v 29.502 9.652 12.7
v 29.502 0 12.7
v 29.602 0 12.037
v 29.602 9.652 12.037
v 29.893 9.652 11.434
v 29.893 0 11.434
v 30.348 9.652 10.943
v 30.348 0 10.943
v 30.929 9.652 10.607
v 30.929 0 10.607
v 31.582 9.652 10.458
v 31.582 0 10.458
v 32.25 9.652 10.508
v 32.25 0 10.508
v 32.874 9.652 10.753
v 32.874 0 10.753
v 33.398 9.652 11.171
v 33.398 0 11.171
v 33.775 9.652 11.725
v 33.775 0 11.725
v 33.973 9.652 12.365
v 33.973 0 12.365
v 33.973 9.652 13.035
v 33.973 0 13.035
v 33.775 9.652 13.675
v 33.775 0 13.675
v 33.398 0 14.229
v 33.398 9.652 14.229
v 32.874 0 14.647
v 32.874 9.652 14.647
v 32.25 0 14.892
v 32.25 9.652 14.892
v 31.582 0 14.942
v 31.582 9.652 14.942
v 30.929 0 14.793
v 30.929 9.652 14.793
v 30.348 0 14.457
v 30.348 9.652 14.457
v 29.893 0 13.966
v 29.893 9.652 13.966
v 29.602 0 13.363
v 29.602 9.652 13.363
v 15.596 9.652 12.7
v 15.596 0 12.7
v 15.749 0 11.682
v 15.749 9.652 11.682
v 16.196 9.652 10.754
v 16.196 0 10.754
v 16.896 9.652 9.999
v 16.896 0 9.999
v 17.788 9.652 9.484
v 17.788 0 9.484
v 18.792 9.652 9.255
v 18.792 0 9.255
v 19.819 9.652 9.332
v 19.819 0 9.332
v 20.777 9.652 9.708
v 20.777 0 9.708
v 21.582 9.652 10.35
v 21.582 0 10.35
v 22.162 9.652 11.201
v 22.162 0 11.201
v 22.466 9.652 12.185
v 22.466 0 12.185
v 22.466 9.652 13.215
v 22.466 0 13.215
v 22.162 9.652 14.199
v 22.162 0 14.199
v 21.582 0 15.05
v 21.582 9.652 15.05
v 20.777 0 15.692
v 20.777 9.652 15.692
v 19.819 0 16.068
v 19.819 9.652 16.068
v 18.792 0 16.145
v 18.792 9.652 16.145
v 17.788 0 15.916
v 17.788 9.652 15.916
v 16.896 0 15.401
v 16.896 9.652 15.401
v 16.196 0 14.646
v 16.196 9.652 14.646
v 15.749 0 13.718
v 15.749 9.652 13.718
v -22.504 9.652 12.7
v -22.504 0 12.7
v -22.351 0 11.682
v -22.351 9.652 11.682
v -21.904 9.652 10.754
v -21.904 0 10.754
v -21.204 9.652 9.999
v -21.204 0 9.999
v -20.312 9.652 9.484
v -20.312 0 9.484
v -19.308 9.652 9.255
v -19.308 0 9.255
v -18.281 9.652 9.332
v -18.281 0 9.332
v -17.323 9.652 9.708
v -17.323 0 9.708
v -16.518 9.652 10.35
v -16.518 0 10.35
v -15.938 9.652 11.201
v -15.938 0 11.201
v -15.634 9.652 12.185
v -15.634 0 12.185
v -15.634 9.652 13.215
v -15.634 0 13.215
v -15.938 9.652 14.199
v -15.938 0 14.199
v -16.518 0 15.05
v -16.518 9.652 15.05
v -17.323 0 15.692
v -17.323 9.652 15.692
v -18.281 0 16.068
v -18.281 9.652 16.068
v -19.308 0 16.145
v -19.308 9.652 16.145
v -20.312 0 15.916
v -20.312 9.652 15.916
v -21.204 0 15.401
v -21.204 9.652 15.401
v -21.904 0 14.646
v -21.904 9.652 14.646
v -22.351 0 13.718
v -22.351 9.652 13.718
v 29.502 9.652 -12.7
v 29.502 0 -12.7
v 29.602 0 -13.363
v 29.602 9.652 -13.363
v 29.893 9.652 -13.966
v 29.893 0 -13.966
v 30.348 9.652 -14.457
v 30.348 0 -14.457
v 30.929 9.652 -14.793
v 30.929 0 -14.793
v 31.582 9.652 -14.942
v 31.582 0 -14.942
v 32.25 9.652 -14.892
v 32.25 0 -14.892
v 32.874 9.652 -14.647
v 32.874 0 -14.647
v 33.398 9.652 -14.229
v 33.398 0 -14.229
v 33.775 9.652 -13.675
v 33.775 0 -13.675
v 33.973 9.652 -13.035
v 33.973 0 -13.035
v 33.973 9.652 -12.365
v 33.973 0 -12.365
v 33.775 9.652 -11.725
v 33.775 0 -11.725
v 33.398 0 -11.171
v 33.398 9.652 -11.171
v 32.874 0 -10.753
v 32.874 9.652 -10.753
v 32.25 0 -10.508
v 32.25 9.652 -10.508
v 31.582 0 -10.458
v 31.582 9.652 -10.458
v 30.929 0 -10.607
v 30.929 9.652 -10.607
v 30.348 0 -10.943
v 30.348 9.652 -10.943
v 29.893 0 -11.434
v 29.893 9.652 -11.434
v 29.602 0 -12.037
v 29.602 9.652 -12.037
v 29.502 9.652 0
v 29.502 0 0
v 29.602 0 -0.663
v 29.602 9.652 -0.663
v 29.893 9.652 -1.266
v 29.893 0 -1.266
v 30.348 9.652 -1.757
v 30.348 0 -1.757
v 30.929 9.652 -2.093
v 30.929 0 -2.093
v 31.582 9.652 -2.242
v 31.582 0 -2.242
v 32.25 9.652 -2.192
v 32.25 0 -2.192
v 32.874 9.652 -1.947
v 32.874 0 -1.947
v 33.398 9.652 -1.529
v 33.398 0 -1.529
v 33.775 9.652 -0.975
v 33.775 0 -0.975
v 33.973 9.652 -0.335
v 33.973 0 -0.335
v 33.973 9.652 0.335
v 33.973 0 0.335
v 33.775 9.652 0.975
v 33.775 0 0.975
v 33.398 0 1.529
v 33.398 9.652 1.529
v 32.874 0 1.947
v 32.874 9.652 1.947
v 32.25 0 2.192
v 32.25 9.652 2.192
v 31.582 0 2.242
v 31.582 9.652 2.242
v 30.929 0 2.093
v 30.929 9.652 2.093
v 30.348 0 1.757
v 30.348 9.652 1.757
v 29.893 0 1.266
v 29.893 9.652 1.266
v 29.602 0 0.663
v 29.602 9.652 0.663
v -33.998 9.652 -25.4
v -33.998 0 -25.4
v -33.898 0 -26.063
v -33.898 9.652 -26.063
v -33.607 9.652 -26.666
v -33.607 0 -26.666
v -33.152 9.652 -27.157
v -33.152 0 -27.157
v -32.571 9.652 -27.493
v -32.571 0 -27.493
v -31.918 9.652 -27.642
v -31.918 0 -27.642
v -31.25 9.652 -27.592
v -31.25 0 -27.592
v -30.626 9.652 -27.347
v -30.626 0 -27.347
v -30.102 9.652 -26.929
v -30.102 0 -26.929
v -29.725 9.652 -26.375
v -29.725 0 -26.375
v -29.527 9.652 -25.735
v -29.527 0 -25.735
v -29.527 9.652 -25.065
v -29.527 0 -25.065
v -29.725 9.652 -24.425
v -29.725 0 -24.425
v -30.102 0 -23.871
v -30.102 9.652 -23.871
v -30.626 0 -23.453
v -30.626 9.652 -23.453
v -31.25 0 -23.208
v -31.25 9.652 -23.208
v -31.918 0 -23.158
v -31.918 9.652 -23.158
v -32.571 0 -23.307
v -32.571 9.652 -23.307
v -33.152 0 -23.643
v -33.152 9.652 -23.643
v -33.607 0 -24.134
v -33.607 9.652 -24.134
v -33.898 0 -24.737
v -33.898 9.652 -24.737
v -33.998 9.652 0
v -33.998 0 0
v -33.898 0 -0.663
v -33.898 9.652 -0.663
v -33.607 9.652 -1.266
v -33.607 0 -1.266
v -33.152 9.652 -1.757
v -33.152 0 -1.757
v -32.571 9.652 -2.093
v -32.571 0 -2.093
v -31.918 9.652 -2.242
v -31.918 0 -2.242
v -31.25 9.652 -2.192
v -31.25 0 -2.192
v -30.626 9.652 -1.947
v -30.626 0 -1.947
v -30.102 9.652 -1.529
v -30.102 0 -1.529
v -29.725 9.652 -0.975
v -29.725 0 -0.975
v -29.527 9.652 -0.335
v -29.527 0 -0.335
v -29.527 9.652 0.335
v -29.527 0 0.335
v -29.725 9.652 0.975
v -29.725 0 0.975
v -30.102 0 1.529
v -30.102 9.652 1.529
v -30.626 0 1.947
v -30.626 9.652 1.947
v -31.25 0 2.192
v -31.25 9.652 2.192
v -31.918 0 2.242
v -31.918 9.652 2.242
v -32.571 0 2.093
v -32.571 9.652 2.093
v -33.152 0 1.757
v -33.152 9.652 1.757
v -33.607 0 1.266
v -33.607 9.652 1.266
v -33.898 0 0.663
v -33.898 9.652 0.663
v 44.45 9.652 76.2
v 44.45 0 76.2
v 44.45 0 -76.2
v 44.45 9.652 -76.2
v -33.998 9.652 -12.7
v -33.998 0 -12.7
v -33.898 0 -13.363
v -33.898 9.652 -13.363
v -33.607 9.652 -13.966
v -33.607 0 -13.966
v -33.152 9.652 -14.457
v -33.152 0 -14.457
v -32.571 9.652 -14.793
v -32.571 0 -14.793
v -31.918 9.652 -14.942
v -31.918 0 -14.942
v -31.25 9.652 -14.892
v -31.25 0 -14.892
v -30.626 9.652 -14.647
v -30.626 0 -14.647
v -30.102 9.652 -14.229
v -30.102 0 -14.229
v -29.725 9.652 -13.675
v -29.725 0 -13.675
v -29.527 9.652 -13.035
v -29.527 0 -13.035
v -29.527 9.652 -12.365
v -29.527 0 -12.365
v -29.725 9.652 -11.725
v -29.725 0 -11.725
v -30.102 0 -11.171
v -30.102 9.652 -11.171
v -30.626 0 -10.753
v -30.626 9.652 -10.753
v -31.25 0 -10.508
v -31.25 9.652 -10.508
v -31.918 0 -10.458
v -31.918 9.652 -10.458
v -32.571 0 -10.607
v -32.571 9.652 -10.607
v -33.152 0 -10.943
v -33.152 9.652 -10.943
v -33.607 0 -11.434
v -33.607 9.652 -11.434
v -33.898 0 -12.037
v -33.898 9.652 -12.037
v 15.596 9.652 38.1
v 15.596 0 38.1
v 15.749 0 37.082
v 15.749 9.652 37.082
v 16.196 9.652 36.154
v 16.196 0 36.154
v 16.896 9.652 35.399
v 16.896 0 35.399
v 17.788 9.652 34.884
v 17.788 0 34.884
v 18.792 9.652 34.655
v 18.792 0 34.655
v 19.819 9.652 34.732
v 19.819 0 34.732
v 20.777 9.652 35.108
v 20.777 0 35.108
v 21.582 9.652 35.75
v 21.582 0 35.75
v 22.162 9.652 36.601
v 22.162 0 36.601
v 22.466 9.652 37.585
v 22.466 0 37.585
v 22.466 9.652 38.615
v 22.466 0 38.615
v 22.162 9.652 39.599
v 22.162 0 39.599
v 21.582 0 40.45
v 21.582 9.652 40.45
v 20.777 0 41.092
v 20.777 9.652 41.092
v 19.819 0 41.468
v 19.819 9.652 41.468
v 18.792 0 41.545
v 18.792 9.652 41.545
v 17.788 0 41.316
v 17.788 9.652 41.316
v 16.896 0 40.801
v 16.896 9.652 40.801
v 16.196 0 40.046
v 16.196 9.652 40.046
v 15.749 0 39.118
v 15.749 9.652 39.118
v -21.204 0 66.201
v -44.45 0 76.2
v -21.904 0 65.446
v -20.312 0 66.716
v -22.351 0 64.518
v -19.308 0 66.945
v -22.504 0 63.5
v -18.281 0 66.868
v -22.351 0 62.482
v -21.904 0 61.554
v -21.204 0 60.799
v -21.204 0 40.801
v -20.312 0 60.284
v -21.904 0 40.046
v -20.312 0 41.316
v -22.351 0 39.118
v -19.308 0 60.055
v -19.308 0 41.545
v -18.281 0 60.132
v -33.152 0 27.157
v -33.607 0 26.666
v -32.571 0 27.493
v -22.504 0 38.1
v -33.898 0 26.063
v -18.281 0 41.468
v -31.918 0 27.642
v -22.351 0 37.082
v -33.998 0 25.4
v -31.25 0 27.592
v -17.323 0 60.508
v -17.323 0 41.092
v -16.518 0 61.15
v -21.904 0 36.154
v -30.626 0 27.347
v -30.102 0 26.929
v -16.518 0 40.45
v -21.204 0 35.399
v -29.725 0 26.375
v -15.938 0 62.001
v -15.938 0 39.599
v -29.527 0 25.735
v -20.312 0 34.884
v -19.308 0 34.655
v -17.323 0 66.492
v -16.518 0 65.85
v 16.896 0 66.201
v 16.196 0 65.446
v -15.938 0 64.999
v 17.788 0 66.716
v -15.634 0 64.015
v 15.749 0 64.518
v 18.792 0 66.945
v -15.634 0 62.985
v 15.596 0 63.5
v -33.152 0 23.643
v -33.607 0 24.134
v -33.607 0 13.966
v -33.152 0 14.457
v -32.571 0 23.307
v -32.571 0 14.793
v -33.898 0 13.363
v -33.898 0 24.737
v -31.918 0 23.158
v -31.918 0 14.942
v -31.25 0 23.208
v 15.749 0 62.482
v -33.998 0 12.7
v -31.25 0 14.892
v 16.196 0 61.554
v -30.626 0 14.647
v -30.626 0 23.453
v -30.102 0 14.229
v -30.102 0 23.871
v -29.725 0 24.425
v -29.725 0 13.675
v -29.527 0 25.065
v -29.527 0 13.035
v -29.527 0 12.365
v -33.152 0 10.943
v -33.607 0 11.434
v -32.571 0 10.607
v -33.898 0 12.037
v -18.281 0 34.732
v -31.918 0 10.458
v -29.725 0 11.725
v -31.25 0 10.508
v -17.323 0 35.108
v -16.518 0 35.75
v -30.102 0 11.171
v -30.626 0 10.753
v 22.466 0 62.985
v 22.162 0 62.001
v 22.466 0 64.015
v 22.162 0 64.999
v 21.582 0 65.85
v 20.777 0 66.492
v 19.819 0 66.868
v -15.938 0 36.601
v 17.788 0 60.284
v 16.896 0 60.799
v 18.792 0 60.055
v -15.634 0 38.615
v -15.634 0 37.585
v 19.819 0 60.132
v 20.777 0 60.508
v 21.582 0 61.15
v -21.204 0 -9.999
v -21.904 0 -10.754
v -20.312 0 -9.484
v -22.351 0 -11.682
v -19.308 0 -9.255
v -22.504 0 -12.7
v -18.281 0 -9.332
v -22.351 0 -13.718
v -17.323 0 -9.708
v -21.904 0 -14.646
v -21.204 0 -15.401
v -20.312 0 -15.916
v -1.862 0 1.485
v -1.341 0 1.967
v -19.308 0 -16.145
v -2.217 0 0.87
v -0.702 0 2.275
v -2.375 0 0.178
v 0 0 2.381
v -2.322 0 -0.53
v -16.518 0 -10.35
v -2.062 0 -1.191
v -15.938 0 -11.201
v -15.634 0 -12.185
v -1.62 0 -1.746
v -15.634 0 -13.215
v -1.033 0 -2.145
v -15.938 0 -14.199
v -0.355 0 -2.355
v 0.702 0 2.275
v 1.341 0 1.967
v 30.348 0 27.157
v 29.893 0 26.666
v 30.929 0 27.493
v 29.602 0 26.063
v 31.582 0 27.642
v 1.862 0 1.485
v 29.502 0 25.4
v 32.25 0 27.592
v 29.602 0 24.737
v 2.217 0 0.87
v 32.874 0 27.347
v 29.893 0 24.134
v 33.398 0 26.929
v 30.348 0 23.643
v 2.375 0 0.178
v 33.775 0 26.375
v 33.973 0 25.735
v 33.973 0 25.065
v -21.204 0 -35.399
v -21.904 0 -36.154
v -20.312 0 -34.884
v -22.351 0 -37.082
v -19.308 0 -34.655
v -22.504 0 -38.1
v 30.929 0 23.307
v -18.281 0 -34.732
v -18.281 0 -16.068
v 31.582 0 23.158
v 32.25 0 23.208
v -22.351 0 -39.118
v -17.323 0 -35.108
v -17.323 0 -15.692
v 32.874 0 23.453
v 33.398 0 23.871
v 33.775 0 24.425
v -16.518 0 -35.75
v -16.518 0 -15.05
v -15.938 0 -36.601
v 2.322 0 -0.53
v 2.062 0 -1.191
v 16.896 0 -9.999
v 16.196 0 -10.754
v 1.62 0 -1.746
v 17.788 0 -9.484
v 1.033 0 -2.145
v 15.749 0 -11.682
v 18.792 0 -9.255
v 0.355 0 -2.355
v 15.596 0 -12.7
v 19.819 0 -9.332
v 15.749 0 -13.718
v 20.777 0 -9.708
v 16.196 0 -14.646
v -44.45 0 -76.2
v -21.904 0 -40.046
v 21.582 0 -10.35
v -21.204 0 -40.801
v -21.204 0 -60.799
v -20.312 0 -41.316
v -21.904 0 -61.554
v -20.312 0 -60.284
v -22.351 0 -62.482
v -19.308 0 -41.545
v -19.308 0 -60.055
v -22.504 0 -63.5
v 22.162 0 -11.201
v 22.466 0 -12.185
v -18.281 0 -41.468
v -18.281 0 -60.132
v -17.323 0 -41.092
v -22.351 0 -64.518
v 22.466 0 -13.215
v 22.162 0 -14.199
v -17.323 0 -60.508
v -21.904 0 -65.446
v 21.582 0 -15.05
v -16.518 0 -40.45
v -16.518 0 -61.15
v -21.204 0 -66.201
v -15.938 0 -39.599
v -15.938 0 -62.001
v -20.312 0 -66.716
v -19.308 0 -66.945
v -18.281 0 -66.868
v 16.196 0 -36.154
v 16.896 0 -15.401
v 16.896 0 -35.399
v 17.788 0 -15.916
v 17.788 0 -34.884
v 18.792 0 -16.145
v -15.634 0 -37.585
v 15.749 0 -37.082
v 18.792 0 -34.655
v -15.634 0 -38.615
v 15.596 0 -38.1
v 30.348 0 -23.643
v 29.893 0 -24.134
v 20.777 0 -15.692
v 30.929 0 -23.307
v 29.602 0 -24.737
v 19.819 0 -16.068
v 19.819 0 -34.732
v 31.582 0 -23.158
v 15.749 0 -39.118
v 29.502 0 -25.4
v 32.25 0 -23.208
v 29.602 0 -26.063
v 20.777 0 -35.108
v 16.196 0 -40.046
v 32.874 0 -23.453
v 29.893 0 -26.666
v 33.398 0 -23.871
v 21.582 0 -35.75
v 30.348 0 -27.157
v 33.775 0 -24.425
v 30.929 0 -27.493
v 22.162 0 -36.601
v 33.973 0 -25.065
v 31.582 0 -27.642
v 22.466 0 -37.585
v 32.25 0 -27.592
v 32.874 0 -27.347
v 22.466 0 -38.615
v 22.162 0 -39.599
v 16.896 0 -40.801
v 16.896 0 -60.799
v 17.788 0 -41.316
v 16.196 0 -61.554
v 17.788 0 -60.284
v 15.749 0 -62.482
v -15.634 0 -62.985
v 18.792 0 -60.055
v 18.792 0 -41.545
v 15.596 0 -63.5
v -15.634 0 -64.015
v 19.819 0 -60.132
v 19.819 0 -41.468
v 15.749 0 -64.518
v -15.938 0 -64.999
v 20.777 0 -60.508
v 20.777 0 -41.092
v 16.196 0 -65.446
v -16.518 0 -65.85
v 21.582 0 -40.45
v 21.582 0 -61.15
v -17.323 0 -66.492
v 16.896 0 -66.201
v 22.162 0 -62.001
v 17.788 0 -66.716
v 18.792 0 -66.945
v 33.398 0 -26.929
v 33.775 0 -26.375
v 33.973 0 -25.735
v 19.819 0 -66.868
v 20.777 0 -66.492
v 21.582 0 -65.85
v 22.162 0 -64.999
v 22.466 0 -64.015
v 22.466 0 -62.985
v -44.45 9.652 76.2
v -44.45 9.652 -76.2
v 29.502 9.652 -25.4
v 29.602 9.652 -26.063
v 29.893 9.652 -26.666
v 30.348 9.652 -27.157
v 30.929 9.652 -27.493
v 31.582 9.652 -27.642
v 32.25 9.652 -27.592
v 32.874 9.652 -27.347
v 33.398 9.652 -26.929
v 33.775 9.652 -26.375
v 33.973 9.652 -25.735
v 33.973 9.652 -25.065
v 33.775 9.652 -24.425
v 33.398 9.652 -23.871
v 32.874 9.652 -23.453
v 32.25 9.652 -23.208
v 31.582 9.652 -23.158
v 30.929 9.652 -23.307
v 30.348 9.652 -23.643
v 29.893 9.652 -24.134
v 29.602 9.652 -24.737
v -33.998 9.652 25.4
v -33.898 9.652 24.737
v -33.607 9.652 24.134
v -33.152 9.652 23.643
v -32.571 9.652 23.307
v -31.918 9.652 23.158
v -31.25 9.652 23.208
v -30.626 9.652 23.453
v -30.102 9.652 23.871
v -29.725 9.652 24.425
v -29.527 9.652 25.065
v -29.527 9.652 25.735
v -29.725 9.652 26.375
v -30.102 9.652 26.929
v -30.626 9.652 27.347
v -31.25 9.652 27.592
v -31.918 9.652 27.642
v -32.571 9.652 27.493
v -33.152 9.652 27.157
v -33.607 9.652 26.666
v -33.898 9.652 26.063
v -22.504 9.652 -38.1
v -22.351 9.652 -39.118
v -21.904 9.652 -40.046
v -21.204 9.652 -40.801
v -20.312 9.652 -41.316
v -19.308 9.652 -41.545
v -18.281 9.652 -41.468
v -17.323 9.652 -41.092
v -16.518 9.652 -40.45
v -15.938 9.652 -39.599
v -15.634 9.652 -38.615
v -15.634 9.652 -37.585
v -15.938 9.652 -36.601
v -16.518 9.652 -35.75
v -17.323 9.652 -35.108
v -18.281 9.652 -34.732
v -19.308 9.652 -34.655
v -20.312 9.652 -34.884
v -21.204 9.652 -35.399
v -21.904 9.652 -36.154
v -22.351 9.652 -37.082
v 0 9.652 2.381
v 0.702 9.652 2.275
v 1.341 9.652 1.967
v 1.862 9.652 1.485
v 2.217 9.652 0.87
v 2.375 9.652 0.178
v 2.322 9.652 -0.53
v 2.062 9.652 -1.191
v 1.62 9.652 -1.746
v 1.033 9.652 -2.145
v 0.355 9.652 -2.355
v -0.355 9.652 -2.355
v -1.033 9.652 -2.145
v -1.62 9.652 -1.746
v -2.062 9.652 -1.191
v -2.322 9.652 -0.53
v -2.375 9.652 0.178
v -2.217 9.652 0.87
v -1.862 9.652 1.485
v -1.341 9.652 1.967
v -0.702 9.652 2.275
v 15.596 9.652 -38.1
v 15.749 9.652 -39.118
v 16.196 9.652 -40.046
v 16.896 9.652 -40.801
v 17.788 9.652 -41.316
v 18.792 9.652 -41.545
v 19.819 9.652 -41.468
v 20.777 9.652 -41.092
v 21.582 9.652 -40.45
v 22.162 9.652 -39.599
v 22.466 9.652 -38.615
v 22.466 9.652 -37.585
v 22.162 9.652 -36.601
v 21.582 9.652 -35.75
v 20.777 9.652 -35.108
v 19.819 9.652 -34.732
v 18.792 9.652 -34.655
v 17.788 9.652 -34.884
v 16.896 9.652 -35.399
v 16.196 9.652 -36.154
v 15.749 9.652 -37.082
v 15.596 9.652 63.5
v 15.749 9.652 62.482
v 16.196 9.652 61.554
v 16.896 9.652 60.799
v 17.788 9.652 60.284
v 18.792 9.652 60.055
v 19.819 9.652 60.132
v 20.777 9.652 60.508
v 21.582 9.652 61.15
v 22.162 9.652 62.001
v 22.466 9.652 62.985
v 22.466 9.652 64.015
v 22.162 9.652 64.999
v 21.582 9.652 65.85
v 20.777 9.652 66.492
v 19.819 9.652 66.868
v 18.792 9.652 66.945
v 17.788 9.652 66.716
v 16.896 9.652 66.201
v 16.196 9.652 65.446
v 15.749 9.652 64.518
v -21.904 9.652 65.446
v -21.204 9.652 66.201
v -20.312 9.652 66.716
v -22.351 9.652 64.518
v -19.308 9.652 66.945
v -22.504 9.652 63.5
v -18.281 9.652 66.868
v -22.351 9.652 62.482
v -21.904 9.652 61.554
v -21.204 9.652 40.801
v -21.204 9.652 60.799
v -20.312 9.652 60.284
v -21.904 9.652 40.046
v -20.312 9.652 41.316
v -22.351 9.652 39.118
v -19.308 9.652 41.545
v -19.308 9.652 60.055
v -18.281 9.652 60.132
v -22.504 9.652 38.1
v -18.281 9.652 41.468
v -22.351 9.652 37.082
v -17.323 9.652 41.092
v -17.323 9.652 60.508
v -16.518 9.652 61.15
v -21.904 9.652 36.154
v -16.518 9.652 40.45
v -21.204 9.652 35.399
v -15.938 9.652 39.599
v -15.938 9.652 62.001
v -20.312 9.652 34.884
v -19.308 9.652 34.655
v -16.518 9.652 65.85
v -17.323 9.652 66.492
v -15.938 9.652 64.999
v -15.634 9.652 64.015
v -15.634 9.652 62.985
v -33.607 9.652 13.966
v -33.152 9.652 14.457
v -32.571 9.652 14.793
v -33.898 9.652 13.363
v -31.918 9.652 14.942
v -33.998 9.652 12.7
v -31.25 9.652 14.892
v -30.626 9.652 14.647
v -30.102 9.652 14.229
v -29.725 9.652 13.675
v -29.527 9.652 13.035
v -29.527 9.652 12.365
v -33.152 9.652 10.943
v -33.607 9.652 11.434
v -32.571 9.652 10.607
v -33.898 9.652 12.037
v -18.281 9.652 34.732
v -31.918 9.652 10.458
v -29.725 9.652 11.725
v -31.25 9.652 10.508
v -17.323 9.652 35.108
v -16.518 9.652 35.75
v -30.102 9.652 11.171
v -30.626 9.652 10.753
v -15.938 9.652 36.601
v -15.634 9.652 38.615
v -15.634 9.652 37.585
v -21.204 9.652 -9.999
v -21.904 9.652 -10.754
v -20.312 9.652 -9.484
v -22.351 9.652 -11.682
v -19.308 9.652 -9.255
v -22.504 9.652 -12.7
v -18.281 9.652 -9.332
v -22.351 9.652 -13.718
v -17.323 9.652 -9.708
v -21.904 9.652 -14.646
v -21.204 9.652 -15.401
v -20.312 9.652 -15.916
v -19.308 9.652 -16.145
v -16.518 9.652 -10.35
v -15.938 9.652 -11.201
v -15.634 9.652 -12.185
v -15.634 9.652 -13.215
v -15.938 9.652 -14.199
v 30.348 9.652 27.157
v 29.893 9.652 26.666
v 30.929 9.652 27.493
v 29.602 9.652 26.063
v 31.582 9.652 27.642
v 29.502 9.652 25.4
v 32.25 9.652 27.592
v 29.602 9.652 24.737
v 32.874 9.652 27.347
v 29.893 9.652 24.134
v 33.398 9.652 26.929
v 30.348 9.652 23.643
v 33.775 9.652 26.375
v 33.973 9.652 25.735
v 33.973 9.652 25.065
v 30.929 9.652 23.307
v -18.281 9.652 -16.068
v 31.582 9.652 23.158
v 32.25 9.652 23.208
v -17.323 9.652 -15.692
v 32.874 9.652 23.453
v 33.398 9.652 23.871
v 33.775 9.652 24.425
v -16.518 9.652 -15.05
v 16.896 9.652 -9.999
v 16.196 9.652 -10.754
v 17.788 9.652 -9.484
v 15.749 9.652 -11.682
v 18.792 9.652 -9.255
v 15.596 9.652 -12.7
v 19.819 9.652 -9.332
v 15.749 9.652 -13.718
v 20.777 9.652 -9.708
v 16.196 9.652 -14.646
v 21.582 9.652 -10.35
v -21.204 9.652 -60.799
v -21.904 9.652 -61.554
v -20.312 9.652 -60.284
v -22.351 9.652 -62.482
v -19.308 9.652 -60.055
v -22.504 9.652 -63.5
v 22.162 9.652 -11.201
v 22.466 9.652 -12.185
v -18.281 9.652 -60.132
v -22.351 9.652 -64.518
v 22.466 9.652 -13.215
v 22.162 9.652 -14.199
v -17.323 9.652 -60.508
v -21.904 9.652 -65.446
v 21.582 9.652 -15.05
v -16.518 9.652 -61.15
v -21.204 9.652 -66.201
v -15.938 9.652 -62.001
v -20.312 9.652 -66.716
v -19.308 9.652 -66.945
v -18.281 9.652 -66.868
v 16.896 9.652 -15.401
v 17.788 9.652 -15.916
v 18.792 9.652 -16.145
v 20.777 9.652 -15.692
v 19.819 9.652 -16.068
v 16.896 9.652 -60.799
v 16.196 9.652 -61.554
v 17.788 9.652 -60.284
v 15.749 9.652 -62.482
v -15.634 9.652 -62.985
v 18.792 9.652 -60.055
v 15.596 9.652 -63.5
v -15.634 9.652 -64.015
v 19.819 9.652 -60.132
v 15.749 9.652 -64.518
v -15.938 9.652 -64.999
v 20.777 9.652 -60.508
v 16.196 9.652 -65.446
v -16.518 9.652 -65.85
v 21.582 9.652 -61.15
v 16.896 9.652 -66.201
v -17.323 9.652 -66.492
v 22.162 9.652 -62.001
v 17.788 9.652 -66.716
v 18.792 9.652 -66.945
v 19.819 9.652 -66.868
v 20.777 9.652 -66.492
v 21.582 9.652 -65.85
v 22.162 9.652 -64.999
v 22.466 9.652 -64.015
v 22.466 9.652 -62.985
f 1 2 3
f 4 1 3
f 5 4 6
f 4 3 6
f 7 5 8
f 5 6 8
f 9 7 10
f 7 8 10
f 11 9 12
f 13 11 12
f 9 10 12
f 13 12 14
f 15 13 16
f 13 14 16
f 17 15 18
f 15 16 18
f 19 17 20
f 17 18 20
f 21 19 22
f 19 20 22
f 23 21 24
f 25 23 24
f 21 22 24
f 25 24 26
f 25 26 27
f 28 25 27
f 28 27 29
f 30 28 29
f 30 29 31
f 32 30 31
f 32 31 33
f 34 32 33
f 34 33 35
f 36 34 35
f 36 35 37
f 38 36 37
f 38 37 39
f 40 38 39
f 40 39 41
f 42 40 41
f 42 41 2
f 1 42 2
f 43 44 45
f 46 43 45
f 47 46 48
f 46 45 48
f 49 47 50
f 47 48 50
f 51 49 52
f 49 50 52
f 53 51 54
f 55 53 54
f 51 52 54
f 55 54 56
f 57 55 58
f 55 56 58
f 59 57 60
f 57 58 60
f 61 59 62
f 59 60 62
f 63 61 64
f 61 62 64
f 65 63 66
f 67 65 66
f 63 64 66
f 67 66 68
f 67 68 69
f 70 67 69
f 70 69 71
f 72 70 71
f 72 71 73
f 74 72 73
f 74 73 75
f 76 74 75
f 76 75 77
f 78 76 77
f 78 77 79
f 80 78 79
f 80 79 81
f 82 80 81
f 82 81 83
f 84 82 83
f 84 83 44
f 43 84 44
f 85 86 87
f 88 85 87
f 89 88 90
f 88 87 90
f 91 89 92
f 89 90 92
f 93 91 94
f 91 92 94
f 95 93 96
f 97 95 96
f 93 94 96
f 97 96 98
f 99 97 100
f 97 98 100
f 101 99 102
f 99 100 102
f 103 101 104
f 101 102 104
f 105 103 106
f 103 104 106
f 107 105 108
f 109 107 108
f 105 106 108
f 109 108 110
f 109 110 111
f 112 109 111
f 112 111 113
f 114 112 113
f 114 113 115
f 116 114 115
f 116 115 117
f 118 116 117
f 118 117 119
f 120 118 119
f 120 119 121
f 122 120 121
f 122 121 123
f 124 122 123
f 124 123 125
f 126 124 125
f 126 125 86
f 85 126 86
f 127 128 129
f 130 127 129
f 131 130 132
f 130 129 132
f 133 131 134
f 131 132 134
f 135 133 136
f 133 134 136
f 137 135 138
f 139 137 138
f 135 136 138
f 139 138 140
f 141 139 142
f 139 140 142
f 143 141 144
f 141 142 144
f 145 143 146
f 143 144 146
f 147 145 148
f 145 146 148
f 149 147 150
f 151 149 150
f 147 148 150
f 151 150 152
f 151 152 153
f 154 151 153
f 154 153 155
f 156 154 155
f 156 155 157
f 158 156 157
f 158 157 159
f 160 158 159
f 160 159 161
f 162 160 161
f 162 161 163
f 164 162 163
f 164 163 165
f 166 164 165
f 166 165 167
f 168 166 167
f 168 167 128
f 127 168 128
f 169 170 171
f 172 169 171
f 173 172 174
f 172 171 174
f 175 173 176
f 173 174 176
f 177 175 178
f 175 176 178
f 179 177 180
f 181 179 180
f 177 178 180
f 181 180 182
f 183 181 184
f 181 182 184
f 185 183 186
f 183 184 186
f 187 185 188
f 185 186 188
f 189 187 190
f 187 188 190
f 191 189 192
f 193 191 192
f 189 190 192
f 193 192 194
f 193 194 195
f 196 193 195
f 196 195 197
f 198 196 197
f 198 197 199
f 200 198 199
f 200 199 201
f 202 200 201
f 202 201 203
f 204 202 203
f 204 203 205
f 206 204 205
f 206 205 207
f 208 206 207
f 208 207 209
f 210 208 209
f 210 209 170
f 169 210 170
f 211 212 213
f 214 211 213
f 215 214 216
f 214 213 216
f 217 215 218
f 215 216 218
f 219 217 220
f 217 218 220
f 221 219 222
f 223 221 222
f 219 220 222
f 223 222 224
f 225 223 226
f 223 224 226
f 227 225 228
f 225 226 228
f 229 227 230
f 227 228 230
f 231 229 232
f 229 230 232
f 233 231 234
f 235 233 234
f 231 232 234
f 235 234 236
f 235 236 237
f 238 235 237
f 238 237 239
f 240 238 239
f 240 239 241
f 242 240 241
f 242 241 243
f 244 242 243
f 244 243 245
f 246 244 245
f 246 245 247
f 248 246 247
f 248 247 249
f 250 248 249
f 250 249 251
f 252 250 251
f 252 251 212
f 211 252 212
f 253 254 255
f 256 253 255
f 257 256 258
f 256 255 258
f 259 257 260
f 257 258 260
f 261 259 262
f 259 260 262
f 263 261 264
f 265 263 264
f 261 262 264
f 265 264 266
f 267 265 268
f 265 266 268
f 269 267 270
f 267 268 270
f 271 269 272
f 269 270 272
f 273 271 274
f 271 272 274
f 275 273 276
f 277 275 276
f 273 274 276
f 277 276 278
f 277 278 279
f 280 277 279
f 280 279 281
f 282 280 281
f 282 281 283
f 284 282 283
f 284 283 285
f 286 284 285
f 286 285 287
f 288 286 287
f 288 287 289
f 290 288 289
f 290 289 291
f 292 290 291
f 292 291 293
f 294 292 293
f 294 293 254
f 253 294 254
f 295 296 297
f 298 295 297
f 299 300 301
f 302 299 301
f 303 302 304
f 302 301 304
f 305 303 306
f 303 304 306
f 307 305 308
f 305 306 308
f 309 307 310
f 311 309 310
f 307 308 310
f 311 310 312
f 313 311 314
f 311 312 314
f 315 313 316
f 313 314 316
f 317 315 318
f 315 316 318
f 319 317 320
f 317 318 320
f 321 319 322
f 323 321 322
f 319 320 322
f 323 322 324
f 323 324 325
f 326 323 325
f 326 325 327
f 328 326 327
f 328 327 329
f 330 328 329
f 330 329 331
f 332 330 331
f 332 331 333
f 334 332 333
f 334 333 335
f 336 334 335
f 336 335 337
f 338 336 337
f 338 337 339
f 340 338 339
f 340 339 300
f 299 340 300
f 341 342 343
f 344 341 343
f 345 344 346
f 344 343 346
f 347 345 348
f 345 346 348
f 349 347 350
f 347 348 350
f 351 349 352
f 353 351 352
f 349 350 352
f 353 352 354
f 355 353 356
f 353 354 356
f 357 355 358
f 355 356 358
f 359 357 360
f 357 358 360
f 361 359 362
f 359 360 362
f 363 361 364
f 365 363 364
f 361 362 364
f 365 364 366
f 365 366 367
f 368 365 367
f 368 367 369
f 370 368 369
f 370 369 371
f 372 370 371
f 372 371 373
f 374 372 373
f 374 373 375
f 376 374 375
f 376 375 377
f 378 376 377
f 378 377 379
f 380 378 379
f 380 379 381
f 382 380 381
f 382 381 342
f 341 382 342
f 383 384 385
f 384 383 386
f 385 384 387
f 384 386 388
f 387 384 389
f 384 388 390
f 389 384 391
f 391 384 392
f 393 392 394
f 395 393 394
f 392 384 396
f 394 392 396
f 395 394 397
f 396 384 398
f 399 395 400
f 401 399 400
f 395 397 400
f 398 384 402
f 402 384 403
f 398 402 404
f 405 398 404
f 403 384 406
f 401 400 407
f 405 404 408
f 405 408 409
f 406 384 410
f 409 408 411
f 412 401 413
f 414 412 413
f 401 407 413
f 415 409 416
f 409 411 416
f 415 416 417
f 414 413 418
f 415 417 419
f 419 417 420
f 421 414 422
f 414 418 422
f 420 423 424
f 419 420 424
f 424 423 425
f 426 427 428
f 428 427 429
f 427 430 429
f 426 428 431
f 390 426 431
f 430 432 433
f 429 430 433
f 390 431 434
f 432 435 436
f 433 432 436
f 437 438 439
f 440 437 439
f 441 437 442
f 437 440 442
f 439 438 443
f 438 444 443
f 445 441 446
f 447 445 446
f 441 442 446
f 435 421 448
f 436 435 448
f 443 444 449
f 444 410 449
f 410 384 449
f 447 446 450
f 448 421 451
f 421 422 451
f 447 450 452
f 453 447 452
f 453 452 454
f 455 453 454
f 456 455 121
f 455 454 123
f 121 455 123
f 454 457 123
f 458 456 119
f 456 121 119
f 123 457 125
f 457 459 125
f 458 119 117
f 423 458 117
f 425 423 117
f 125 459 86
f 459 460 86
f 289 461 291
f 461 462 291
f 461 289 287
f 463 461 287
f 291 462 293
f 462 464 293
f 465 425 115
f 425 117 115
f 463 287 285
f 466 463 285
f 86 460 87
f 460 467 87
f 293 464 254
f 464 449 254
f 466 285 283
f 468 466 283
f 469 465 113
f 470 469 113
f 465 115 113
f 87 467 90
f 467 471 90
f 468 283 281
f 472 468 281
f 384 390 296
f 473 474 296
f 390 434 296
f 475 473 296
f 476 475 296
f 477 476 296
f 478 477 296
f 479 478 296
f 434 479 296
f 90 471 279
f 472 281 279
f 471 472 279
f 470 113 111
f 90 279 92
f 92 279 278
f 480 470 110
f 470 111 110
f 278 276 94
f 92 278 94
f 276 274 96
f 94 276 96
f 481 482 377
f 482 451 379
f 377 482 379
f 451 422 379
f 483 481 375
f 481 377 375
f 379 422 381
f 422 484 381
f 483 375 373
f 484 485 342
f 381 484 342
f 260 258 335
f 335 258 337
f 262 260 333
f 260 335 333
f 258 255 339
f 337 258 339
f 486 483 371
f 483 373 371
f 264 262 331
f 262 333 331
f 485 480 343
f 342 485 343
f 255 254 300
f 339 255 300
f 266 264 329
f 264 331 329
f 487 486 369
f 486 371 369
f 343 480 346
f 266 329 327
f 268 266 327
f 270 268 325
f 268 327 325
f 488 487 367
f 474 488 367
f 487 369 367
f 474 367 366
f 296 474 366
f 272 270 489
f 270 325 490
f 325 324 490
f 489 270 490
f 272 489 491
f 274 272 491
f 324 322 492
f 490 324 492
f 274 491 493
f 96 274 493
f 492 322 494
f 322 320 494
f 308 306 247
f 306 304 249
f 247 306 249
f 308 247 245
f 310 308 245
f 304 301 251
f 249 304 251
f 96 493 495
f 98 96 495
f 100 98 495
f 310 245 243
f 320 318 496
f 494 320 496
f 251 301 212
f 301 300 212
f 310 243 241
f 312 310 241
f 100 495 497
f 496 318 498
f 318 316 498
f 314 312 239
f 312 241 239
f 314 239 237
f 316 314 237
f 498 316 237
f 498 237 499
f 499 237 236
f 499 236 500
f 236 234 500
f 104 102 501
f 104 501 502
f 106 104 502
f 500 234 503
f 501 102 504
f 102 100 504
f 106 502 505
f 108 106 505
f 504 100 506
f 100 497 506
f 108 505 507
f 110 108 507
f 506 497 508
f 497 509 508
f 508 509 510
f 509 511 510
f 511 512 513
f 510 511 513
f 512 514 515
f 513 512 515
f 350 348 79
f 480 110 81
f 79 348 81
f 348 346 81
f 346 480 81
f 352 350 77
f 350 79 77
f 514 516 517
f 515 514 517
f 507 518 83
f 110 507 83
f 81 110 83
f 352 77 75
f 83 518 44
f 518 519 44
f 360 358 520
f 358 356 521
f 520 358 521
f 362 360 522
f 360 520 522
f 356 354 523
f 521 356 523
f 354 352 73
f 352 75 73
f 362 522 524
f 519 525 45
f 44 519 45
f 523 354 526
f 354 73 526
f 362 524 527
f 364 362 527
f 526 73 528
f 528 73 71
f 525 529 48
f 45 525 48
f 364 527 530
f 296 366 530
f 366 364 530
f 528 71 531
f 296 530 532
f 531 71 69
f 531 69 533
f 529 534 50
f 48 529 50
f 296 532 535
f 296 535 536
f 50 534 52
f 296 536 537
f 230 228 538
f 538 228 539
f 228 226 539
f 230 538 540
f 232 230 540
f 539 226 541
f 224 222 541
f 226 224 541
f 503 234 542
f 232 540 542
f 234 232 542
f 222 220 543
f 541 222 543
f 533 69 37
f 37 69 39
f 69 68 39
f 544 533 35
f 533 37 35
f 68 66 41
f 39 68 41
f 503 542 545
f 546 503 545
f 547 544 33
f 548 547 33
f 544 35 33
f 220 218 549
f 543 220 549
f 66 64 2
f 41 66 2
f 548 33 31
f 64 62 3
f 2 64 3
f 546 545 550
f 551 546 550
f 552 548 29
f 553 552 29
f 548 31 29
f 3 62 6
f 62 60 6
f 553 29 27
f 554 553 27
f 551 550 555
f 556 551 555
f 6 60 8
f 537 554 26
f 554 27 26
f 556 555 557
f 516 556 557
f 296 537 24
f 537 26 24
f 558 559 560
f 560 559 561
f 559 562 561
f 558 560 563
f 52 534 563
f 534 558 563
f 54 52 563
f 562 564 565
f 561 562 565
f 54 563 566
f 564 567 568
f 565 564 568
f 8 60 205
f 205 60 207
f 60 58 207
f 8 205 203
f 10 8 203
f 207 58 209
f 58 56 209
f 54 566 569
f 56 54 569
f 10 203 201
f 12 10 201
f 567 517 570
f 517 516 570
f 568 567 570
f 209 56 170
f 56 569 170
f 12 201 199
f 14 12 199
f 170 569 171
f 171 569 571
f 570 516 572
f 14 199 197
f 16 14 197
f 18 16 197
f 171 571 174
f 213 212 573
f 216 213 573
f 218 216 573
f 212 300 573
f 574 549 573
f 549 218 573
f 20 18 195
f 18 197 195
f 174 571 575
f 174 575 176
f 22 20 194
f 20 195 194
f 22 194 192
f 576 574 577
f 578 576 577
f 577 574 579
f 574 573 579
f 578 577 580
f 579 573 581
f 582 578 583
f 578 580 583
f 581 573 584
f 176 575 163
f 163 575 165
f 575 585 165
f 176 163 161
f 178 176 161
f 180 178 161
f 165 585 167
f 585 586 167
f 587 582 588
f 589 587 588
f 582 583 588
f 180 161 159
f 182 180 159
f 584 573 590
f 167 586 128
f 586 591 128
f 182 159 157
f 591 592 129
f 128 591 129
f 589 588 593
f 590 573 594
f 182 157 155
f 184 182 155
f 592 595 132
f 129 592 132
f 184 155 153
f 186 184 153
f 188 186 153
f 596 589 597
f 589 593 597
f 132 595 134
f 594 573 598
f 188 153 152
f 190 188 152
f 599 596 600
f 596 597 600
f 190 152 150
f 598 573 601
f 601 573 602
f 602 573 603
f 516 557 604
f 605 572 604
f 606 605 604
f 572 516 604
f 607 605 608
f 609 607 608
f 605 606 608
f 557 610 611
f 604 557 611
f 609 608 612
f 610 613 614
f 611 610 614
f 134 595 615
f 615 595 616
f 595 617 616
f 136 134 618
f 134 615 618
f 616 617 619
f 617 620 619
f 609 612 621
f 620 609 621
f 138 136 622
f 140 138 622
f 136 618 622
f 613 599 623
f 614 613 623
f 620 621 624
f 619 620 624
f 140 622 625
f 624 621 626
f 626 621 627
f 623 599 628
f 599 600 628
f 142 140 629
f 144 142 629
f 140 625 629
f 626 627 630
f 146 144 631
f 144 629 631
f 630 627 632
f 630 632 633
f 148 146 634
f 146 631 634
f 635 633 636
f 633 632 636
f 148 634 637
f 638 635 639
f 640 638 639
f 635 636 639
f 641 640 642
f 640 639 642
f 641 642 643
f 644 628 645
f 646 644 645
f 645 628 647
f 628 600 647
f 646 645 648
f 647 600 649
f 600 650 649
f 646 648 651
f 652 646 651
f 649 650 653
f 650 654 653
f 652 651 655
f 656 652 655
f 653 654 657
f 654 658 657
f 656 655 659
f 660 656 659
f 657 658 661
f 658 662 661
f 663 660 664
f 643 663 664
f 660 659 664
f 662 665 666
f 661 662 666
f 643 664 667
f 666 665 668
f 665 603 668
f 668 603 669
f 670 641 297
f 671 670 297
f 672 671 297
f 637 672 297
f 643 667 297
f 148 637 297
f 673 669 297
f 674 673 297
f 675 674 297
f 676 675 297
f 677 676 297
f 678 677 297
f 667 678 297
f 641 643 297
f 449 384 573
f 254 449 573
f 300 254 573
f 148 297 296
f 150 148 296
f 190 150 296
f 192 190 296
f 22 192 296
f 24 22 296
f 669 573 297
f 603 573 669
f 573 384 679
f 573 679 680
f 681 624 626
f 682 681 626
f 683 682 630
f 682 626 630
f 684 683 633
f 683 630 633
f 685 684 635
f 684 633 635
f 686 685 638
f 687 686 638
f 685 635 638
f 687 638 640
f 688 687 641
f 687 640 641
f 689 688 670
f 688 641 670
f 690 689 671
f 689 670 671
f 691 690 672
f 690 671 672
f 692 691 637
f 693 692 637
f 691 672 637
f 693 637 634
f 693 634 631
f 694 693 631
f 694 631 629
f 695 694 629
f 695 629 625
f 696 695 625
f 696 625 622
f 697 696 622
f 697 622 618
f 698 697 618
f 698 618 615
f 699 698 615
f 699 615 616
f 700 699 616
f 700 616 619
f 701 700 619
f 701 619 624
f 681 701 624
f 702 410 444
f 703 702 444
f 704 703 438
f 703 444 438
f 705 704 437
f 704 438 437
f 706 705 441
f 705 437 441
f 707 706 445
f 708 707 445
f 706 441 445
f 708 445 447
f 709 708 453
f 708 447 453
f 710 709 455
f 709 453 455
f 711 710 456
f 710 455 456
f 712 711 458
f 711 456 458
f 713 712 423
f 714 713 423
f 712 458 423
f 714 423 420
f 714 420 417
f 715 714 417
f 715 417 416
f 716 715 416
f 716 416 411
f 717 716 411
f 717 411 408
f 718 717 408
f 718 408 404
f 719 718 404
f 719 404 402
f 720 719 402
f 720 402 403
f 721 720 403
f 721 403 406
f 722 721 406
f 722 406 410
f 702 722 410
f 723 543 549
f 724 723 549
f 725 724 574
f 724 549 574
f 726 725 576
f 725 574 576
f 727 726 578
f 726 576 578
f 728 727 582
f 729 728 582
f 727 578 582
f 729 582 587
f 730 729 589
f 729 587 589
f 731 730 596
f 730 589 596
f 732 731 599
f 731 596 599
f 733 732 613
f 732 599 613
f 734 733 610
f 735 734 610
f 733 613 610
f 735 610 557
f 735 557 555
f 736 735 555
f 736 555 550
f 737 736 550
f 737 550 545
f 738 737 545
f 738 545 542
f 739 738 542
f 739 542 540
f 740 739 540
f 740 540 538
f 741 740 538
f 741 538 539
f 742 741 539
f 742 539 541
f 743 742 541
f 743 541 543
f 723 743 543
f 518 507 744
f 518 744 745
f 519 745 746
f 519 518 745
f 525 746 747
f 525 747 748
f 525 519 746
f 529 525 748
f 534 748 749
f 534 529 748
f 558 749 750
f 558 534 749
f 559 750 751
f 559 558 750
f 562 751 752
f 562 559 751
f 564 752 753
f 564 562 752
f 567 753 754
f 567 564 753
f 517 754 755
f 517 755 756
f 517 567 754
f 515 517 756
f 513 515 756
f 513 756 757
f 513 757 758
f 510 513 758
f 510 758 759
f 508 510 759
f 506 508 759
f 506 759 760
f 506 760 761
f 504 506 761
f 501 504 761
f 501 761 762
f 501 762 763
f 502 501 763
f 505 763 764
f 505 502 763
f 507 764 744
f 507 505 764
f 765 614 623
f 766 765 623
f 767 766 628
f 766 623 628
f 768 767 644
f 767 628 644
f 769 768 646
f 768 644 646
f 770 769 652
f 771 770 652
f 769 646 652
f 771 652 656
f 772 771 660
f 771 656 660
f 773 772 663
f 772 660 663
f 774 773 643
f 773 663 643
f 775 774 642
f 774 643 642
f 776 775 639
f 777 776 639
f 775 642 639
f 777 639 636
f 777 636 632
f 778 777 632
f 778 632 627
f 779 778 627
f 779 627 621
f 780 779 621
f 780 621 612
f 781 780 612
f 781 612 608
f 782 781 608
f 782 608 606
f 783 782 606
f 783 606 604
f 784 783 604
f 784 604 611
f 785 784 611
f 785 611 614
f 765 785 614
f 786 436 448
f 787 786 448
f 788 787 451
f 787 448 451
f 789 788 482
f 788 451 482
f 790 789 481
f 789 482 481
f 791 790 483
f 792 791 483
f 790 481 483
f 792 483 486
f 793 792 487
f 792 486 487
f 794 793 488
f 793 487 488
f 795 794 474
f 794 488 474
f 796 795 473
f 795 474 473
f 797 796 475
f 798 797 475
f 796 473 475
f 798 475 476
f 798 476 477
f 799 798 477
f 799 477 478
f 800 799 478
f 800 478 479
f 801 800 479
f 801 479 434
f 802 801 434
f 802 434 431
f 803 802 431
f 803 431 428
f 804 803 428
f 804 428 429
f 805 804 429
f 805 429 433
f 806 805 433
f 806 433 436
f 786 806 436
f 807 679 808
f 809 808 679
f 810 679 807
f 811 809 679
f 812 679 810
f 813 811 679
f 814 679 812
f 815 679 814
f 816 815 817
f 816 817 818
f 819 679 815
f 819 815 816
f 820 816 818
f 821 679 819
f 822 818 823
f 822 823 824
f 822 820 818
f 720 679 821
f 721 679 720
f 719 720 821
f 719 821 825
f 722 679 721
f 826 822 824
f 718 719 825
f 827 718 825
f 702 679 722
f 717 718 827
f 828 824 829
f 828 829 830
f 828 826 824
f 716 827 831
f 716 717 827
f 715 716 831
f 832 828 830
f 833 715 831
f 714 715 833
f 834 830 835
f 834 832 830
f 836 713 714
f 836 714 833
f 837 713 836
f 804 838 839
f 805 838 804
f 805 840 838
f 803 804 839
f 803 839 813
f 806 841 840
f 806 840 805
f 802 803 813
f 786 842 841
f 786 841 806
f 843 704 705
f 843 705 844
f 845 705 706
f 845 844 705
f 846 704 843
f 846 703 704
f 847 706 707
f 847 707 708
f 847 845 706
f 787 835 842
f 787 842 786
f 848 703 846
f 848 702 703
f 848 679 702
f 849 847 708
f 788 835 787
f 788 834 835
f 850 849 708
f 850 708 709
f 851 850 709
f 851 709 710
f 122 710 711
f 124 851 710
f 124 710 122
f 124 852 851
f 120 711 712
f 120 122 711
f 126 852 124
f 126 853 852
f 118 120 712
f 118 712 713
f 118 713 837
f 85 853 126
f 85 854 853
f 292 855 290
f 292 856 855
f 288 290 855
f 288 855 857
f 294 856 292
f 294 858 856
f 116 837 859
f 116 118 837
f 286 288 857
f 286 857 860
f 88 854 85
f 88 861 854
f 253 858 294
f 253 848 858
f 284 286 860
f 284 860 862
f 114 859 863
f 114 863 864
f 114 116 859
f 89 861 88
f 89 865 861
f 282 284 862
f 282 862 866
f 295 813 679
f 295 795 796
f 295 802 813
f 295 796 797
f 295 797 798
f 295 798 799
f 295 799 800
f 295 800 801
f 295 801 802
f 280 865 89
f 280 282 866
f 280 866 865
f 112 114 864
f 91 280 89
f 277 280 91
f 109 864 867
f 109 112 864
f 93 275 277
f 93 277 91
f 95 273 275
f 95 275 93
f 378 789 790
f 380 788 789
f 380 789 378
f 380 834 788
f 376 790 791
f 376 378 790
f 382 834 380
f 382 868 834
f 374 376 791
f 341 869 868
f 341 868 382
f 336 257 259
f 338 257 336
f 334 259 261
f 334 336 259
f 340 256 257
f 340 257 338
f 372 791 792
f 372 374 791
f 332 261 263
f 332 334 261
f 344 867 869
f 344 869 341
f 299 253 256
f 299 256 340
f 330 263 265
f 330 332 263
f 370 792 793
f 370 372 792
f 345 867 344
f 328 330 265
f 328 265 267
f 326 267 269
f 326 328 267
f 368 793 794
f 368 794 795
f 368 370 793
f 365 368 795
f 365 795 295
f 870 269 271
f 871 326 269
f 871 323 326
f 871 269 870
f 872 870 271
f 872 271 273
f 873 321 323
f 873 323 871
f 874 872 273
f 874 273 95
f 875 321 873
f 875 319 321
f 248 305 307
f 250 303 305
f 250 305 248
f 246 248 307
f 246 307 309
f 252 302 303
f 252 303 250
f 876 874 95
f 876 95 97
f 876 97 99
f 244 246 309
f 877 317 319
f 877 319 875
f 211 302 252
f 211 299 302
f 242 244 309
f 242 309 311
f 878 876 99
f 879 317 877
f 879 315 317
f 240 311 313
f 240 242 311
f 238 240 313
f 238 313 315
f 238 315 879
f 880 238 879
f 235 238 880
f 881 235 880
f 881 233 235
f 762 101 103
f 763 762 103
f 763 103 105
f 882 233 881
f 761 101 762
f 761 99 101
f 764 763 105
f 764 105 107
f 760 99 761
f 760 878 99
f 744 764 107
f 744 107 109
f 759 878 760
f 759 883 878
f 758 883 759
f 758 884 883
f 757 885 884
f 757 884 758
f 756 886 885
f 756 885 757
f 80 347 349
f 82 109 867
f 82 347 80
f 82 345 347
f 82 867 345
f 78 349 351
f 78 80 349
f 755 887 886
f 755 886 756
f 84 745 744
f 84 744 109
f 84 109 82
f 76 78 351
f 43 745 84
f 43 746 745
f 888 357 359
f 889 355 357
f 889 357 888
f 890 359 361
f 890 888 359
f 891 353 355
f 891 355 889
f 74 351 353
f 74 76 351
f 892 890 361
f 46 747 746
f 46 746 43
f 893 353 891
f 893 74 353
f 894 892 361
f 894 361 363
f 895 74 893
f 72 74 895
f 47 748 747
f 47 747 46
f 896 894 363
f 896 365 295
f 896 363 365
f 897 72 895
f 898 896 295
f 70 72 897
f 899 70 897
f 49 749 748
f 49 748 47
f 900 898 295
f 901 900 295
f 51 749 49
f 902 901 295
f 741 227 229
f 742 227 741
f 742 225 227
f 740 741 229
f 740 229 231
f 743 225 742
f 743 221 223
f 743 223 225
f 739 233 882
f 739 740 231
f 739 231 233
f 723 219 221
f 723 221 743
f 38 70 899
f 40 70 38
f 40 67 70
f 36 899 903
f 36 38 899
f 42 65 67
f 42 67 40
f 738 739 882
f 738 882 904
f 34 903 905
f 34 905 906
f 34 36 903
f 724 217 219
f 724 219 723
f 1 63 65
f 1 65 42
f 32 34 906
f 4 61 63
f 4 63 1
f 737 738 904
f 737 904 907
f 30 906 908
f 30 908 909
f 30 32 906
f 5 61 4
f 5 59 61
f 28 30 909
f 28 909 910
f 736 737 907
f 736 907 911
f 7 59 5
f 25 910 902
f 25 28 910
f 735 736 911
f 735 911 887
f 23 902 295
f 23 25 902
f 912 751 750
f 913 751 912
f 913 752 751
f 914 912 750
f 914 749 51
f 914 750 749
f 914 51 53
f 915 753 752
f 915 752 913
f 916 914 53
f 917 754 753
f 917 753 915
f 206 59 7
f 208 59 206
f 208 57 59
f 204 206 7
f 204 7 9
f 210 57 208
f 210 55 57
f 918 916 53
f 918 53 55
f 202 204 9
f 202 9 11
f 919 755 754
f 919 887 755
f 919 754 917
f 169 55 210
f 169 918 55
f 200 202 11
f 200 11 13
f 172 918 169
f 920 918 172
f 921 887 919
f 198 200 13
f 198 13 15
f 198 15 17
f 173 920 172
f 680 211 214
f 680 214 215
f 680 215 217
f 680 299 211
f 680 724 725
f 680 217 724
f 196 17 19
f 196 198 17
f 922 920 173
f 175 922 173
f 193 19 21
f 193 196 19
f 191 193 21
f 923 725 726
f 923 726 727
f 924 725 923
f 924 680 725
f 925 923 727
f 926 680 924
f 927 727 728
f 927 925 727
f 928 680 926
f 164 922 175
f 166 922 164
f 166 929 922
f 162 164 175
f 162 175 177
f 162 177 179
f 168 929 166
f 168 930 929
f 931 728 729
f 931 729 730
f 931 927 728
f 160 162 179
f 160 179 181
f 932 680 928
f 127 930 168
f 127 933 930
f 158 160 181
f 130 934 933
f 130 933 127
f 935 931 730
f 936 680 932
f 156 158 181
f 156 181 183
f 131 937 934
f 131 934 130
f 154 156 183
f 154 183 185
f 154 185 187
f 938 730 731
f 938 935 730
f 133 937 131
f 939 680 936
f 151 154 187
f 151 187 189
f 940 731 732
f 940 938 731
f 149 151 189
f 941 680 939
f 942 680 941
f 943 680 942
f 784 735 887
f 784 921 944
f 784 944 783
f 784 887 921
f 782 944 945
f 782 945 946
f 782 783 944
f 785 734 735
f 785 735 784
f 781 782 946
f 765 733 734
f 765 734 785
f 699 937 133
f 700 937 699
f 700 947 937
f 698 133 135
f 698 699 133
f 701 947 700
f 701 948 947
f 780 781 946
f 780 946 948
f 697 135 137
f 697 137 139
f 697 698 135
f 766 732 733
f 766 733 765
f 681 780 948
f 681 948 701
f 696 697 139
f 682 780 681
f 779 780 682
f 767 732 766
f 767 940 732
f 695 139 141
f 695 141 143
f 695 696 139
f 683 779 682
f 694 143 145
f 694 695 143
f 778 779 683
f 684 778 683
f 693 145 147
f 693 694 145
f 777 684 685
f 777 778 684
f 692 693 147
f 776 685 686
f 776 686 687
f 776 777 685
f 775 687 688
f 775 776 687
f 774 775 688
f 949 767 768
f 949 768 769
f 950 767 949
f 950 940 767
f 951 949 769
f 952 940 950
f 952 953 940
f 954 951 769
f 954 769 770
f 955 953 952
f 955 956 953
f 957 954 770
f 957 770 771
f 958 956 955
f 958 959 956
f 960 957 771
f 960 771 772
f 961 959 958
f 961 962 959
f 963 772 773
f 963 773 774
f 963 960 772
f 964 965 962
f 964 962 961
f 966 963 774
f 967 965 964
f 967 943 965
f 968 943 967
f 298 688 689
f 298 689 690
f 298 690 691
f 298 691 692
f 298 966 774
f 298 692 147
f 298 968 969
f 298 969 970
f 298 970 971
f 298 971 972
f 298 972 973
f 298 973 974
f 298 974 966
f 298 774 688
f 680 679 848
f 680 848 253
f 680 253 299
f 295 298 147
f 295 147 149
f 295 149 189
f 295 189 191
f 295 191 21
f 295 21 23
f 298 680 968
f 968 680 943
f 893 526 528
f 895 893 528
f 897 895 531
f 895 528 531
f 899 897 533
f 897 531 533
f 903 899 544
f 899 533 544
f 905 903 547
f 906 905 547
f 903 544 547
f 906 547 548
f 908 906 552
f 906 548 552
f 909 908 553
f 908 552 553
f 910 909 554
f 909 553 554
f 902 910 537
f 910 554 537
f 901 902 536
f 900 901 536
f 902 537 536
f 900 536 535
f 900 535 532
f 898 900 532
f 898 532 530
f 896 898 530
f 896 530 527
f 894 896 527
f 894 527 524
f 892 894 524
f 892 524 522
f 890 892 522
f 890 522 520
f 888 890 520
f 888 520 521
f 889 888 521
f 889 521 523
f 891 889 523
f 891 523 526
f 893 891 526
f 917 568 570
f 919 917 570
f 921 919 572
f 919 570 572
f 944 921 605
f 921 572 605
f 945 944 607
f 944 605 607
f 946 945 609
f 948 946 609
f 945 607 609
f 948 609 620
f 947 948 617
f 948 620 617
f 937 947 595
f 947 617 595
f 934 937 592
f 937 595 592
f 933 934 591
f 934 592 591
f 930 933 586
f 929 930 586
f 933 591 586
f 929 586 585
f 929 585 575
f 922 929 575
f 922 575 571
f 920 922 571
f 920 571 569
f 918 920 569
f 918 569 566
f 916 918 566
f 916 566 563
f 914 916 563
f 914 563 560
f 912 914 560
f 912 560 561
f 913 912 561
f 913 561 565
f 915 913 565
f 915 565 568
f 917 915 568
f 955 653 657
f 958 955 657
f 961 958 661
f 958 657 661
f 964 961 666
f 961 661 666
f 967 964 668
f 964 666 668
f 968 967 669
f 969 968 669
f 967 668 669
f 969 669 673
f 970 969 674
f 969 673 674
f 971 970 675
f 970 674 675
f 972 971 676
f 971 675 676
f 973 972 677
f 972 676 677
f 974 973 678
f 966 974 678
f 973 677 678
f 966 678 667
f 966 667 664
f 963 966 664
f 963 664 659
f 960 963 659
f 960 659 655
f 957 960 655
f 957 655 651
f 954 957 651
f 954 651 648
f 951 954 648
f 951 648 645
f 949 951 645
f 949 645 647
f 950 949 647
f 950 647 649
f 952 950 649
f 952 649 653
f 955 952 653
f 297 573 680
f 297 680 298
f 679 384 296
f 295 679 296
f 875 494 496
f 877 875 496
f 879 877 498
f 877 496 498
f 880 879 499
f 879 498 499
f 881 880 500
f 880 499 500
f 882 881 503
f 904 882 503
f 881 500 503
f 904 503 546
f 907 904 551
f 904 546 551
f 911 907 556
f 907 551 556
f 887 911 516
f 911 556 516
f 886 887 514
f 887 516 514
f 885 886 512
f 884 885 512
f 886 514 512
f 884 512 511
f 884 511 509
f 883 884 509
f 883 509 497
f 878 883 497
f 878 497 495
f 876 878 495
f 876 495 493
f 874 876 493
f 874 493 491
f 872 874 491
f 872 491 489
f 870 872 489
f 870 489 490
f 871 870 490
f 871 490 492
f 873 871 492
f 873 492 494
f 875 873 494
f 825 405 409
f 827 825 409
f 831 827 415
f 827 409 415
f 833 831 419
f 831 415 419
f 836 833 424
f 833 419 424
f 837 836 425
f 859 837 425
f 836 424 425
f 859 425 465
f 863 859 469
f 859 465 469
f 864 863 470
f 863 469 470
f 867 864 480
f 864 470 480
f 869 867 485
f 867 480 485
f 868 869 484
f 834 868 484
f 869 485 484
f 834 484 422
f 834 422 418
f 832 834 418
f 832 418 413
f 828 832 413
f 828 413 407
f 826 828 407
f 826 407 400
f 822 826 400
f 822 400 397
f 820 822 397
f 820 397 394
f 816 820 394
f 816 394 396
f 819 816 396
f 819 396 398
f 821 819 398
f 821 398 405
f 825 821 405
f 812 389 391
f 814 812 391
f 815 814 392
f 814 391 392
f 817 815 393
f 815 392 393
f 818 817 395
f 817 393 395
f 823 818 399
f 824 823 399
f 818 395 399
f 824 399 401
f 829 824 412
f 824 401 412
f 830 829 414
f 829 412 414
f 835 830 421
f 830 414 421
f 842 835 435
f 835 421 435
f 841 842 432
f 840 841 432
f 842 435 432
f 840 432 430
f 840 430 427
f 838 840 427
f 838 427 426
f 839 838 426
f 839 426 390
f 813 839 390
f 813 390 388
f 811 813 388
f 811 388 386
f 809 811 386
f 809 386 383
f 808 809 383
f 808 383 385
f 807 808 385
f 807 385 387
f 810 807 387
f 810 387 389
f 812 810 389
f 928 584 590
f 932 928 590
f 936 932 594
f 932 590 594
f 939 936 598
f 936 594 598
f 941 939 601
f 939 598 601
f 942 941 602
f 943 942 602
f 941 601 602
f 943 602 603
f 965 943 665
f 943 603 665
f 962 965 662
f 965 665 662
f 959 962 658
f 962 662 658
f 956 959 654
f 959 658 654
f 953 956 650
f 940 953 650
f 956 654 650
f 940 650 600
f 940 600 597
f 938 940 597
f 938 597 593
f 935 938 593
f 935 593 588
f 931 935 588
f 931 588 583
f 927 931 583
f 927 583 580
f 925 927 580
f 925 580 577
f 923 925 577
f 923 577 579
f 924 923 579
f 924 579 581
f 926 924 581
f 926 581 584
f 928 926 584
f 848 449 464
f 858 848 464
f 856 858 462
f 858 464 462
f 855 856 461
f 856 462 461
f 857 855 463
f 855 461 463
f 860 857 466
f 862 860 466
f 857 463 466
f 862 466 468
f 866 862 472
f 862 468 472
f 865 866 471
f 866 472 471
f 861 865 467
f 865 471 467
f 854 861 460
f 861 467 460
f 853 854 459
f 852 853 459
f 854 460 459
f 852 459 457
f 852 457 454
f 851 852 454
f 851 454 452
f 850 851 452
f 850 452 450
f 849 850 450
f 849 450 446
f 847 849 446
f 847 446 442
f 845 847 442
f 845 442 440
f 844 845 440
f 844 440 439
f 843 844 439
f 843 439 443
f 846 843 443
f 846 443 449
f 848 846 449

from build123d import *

# Parameters (mm, degrees)
SKETCH1_W                = 88.9
SKETCH1_H                = 152.4
SKETCH1_R                = 2.38125
BOSS_EXTRUDE1_DEPTH      = 9.652
F_5_16_24_TAPPED_HOLE1_D = 6.9088
F_12_24_TAPPED_HOLE1_D   = 4.4958


with BuildPart() as part:
    # Sketch1 → Boss-Extrude1 (new body)
    with BuildSketch(Plane(origin=(0, 0, 0), x_dir=(1, 0, 0), z_dir=(0, 1, 0))):
        Rectangle(SKETCH1_W, SKETCH1_H)
        with Locations(Location((0, 0, 0), (0, 0, 270))):
            Circle(SKETCH1_R, mode=Mode.SUBTRACT)
    extrude(amount=BOSS_EXTRUDE1_DEPTH)

    # 5/16-24 Tapped Hole1 (through all)
    with Locations(Plane(origin=(0, 9.652, 0), x_dir=(1, 0, 0), z_dir=(0, 1, 0))):
        with Locations((19.05, 63.5), (-19.05, 63.5), (-19.05, 38.1), (19.05, 38.1), (19.05, 12.7), (19.05, -12.7), (19.05, -38.1), (19.05, -63.5), (-19.05, 12.7), (-19.05, -12.7), (-19.05, -38.1), (-19.05, -63.5)):
            Hole(F_5_16_24_TAPPED_HOLE1_D / 2)

    # #12-24 Tapped Hole1 (through all)
    with Locations(Plane(origin=(0, 9.652, 0), x_dir=(1, 0, 0), z_dir=(0, 1, 0))):
        with Locations((-31.75, 0), (31.75, 0), (-31.75, 12.7), (-31.75, 25.4), (31.75, 25.4), (31.75, 12.7), (31.75, -12.7), (31.75, -25.4), (-31.75, -12.7), (-31.75, -25.4)):
            Hole(F_12_24_TAPPED_HOLE1_D / 2)


solid = part.part
